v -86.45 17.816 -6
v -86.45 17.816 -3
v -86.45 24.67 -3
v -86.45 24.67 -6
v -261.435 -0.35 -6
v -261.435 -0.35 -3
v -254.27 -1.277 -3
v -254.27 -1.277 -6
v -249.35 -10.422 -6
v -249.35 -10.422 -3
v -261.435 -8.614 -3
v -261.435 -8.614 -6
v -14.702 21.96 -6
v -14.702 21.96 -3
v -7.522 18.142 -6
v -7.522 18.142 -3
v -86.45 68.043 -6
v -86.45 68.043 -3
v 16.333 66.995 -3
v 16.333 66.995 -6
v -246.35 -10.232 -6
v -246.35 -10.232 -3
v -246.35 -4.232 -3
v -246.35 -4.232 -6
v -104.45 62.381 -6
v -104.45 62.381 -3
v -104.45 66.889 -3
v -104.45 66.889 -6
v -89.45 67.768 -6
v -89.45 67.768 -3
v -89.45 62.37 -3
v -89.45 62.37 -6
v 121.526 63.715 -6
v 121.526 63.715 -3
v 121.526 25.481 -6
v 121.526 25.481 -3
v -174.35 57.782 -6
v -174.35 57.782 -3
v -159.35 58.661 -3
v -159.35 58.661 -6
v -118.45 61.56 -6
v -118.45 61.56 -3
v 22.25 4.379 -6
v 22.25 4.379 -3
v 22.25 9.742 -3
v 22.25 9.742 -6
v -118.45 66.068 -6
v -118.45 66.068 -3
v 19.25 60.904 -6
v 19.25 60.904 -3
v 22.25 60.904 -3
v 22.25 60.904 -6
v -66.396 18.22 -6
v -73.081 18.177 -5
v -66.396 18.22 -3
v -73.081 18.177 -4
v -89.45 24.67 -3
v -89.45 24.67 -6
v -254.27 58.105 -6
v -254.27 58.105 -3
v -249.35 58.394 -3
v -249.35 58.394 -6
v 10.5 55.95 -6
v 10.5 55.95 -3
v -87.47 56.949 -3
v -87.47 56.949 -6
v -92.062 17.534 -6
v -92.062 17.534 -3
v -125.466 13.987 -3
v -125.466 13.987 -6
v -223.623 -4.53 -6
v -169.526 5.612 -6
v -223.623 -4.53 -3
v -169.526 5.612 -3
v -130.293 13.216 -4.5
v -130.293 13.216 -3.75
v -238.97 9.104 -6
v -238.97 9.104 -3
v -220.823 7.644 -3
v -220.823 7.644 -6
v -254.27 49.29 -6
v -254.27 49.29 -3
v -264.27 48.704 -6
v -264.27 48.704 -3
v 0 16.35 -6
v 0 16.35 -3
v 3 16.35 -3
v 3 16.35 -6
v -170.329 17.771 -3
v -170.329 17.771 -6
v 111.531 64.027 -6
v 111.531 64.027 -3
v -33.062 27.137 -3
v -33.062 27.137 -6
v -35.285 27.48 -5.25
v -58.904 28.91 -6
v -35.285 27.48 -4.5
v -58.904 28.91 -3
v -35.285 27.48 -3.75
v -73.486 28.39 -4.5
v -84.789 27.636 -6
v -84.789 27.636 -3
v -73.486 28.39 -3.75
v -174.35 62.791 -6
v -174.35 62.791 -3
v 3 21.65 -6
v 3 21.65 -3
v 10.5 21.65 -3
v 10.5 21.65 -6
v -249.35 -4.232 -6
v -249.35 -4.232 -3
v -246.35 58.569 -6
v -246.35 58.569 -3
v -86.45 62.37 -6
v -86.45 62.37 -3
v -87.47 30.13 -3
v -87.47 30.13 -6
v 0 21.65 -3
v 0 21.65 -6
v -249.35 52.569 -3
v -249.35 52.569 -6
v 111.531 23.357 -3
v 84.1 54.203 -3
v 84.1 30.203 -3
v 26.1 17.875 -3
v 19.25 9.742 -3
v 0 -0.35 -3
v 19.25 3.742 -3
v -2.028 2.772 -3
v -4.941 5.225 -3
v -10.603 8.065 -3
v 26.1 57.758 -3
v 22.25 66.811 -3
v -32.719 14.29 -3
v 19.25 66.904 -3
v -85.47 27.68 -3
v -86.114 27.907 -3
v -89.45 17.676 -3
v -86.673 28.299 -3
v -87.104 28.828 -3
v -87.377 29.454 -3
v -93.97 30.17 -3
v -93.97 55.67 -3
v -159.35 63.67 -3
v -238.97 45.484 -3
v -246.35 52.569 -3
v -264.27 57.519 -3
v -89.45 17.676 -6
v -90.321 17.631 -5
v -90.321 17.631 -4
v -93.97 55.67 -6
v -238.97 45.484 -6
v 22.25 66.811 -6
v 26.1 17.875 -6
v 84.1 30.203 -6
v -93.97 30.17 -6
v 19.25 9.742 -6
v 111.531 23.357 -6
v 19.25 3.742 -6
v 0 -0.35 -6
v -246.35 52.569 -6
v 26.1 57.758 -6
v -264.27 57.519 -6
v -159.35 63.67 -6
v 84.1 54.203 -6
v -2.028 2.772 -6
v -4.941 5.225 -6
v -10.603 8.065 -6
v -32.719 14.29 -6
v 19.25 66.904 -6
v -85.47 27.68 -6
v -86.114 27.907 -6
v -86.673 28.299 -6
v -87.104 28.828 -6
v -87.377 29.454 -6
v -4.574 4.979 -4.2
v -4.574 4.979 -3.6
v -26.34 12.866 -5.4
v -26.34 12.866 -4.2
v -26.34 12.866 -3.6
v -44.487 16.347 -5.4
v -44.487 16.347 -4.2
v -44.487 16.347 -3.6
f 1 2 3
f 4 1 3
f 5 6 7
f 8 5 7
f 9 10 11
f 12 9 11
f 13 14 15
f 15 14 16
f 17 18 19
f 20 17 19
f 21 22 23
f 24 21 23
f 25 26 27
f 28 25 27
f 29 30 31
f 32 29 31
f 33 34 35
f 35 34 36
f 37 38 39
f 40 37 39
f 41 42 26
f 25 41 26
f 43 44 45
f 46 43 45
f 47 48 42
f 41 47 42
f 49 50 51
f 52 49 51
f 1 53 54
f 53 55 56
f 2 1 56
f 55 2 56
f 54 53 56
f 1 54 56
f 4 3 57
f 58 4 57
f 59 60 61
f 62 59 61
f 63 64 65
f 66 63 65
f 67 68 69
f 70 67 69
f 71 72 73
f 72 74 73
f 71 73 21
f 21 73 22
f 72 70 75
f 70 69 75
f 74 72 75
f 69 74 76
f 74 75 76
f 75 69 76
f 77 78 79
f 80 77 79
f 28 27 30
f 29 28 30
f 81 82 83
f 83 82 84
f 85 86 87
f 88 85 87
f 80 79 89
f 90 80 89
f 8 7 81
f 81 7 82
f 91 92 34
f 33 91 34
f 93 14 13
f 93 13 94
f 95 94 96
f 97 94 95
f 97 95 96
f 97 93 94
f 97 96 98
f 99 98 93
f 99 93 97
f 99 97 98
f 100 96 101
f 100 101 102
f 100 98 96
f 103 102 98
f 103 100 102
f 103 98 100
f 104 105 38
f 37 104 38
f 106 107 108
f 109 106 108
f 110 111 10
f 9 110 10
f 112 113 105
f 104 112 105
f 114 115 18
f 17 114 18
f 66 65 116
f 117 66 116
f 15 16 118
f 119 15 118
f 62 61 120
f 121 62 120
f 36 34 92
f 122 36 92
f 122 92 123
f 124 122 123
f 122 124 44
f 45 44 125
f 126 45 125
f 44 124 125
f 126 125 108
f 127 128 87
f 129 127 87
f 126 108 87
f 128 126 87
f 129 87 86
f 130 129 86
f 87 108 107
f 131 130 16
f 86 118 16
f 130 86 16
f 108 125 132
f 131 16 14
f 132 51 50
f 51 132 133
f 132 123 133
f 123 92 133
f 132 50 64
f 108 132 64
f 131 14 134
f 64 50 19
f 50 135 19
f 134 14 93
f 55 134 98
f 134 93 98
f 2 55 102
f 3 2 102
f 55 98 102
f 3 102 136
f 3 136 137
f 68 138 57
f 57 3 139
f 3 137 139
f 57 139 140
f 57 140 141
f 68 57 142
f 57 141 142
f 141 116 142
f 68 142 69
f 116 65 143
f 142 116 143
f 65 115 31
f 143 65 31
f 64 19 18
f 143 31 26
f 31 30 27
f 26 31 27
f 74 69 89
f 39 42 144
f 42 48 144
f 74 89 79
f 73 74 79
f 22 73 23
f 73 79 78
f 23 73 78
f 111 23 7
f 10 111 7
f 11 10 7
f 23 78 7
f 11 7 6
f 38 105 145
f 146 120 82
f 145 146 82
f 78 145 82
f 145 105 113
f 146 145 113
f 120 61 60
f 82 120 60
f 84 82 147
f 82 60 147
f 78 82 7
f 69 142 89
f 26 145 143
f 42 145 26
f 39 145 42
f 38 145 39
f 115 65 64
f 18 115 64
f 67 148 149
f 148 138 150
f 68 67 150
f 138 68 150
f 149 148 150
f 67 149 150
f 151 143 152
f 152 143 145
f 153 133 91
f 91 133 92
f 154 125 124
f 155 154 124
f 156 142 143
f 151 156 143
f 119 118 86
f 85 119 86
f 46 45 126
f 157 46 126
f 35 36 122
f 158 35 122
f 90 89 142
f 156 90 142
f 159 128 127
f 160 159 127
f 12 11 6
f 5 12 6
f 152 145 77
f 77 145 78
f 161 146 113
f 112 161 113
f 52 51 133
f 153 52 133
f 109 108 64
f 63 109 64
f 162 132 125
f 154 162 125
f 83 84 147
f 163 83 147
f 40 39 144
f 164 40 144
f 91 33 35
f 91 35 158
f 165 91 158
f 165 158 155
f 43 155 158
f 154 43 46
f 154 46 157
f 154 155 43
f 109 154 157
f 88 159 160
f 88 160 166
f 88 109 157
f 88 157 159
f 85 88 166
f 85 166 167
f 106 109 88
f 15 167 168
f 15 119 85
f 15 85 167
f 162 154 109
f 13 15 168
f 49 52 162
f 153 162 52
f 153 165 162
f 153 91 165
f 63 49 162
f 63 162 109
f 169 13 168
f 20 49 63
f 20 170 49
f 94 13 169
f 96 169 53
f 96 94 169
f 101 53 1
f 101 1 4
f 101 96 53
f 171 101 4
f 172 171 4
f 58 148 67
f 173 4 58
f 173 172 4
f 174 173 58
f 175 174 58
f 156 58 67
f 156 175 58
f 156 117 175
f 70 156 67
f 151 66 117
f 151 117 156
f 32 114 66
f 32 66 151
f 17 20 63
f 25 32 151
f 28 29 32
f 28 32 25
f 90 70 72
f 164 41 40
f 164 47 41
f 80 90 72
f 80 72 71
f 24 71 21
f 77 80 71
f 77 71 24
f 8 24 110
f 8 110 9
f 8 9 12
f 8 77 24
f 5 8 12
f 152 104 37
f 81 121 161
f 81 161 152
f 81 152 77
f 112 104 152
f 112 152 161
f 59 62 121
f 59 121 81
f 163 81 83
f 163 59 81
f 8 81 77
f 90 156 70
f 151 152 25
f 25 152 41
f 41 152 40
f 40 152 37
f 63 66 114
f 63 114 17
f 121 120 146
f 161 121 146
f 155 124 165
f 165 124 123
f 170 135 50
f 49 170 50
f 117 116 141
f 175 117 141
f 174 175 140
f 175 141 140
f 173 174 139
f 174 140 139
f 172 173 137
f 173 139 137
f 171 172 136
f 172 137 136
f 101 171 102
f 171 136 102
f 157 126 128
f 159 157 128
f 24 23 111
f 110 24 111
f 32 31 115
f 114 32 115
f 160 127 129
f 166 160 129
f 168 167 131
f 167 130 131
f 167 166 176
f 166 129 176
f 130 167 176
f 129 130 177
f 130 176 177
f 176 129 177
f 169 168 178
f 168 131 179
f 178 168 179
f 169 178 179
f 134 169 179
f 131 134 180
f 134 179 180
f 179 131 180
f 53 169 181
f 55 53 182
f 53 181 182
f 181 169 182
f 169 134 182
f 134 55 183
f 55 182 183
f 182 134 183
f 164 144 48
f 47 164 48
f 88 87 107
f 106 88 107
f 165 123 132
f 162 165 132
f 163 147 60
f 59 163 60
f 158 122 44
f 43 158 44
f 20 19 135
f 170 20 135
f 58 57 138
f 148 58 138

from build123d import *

# Parameters (mm, degrees)
BOSS_EXTRUDE2_DEPTH = 3


with BuildPart() as part:
    # Sketch6 → Boss-Extrude2 (new body)
    with BuildSketch(Plane(origin=(0, 0, -3), x_dir=(-1, 0, 0), z_dir=(0, 0, -1))):
        with BuildLine():
            Line((-19.25, 3.741713812), (0, -0.35))
            add(Edge.make_bspline(
                [(0, -0.35), (3.178862469, 6.495343287), (8.987756305, 8.032168144), (22.140633739, 13.071207305), (43.250433247, 17.69324185), (66.39602757, 18.219905629)],
                knots=[0, 0, 0, 0, 0, 0, 1, 1, 1, 1, 1, 1], degree=5))
            add(Edge.make_bspline(
                [(66.39602757, 18.219905629), (73.079858249, 18.217137873), (79.768873399, 18.101745103), (86.45, 17.815976098)],
                knots=[0.875945967, 0.875945967, 0.875945967, 0.875945967, 0.985673704, 0.985673704, 0.985673704, 0.985673704], degree=3))
            Line((86.45, 17.815976098), (86.45, 24.670250599))
            Line((86.45, 24.670250599), (89.45, 24.670250599))
            Line((89.45, 24.670250599), (89.45, 17.675984992))
            add(Edge.make_bspline(
                [(89.45, 17.675984992), (90.320899947, 17.631898595), (91.191632468, 17.584767892), (92.062168571, 17.534464817)],
                knots=[1.002100386, 1.002100386, 1.002100386, 1.002100386, 1.01640933, 1.01640933, 1.01640933, 1.01640933], degree=3))
            add(Edge.make_bspline(
                [(92.062168571, 17.534464817), (95.665977641, 17.334138157), (108.464938821, 16.428798519), (140.620964858, 12.117510077), (188.052718325, 1.033122833), (227.303556849, -4.3666315), (246.35, -10.231818509)],
                knots=[0, 0, 0, 0, 0.05922822, 0.210539222, 0.531730365, 0.858409316, 0.858409316, 0.858409316, 0.858409316], degree=3))
            Line((246.35, -10.231818509), (246.35, -4.231818509))
            Line((246.35, -4.231818509), (249.35, -4.231818509))
            Line((249.35, -4.231818509), (249.35, -10.422260297))
            Line((249.35, -10.422260297), (261.434958207, -8.613902826))
            Line((261.434958207, -8.613902826), (261.434958207, -0.35))
            Line((261.434958207, -0.35), (254.27, -1.277143049))
            Line((254.27, -1.277143049), (254.27, 49.289954404))
            Line((254.27, 49.289954404), (264.27, 48.703684462))
            Line((264.27, 48.703684462), (264.27, 57.518794836))
            Line((264.27, 57.518794836), (254.27, 58.105064779))
            Line((254.27, 58.105064779), (249.35, 58.39350959))
            Line((249.35, 58.39350959), (249.35, 52.569390573))
            Line((249.35, 52.569390573), (246.35, 52.569390573))
            Line((246.35, 52.569390573), (246.35, 58.569390573))
            Line((246.35, 58.569390573), (174.35, 62.790534157))
            Line((174.35, 62.790534157), (174.35, 57.781948717))
            Line((174.35, 57.781948717), (159.35, 58.66135363))
            Line((159.35, 58.66135363), (159.35, 63.66993907))
            Line((159.35, 63.66993907), (118.45, 66.067783134))
            Line((118.45, 66.067783134), (118.45, 61.560056238))
            Line((118.45, 61.560056238), (104.45, 62.380834157))
            Line((104.45, 62.380834157), (104.45, 66.888561053))
            Line((104.45, 66.888561053), (89.45, 67.767965967))
            Line((89.45, 67.767965967), (89.45, 62.370250599))
            Line((89.45, 62.370250599), (86.45, 62.370250599))
            Line((86.45, 62.370250599), (86.45, 68.043292799))
            Line((86.45, 68.043292799), (-16.333378442, 66.994986377))
            Line((-16.333378442, 66.994986377), (-19.25, 66.904044127))
            Line((-19.25, 66.904044127), (-19.25, 60.904044127))
            Line((-19.25, 60.904044127), (-22.25, 60.904044127))
            Line((-22.25, 60.904044127), (-22.25, 66.810502081))
            Line((-22.25, 66.810502081), (-111.531056313, 64.026657849))
            Line((-111.531056313, 64.026657849), (-121.52619868, 63.715002493))
            Line((-121.52619868, 63.715002493), (-121.52619868, 25.481190944))
            Line((-121.52619868, 25.481190944), (-111.531056313, 23.356657849))
            Line((-111.531056313, 23.356657849), (-22.25, 4.379383497))
            Line((-22.25, 4.379383497), (-22.25, 9.741713812))
            Line((-22.25, 9.741713812), (-19.25, 9.741713812))
            Line((-19.25, 9.741713812), (-19.25, 3.741713812))
        make_face()
        Polygon((-84.1, 54.203030213), (-26.1, 57.75847956), (-26.1, 17.874749636), (-84.1, 30.203030213), align=None, mode=Mode.SUBTRACT)
        with BuildLine():
            Line((-10.5, 21.65), (-10.5, 55.95))
            Line((-10.5, 55.95), (87.47, 56.949213898))
            Line((87.47, 56.949213898), (87.47, 30.129694509))
            ThreePointArc((87.47, 30.129694509), (86.67270256, 28.299174366), (84.789356805, 27.636229443))
            add(Edge.make_bspline(
                [(14.701665666, 21.959575817), (21.19900444, 24.808951329), (34.471850374, 27.925627057), (54.295468051, 29.219545771), (70.832055402, 28.62299092), (81.026620283, 27.908827105), (84.789356805, 27.636229443)],
                knots=[0.099500985, 0.099500985, 0.099500985, 0.099500985, 0.360279093, 0.592189537, 0.828480504, 0.96707438, 0.96707438, 0.96707438, 0.96707438], degree=3))
            Line((14.701665666, 21.959575817), (7.522354632, 18.142268428))
            Line((7.522354632, 18.142268428), (0, 21.65))
            Line((0, 21.65), (0, 16.35))
            Line((0, 16.35), (-3, 16.35))
            Line((-3, 16.35), (-3, 21.65))
            Line((-3, 21.65), (-10.5, 21.65))
        make_face(mode=Mode.SUBTRACT)
        Polygon((93.97, 30.170250599), (93.97, 55.670250599), (238.97, 45.483901662), (238.97, 9.104044127), (220.823057098, 7.643571), (170.32923345, 17.7710139), align=None, mode=Mode.SUBTRACT)
    extrude(amount=BOSS_EXTRUDE2_DEPTH)


solid = part.part
